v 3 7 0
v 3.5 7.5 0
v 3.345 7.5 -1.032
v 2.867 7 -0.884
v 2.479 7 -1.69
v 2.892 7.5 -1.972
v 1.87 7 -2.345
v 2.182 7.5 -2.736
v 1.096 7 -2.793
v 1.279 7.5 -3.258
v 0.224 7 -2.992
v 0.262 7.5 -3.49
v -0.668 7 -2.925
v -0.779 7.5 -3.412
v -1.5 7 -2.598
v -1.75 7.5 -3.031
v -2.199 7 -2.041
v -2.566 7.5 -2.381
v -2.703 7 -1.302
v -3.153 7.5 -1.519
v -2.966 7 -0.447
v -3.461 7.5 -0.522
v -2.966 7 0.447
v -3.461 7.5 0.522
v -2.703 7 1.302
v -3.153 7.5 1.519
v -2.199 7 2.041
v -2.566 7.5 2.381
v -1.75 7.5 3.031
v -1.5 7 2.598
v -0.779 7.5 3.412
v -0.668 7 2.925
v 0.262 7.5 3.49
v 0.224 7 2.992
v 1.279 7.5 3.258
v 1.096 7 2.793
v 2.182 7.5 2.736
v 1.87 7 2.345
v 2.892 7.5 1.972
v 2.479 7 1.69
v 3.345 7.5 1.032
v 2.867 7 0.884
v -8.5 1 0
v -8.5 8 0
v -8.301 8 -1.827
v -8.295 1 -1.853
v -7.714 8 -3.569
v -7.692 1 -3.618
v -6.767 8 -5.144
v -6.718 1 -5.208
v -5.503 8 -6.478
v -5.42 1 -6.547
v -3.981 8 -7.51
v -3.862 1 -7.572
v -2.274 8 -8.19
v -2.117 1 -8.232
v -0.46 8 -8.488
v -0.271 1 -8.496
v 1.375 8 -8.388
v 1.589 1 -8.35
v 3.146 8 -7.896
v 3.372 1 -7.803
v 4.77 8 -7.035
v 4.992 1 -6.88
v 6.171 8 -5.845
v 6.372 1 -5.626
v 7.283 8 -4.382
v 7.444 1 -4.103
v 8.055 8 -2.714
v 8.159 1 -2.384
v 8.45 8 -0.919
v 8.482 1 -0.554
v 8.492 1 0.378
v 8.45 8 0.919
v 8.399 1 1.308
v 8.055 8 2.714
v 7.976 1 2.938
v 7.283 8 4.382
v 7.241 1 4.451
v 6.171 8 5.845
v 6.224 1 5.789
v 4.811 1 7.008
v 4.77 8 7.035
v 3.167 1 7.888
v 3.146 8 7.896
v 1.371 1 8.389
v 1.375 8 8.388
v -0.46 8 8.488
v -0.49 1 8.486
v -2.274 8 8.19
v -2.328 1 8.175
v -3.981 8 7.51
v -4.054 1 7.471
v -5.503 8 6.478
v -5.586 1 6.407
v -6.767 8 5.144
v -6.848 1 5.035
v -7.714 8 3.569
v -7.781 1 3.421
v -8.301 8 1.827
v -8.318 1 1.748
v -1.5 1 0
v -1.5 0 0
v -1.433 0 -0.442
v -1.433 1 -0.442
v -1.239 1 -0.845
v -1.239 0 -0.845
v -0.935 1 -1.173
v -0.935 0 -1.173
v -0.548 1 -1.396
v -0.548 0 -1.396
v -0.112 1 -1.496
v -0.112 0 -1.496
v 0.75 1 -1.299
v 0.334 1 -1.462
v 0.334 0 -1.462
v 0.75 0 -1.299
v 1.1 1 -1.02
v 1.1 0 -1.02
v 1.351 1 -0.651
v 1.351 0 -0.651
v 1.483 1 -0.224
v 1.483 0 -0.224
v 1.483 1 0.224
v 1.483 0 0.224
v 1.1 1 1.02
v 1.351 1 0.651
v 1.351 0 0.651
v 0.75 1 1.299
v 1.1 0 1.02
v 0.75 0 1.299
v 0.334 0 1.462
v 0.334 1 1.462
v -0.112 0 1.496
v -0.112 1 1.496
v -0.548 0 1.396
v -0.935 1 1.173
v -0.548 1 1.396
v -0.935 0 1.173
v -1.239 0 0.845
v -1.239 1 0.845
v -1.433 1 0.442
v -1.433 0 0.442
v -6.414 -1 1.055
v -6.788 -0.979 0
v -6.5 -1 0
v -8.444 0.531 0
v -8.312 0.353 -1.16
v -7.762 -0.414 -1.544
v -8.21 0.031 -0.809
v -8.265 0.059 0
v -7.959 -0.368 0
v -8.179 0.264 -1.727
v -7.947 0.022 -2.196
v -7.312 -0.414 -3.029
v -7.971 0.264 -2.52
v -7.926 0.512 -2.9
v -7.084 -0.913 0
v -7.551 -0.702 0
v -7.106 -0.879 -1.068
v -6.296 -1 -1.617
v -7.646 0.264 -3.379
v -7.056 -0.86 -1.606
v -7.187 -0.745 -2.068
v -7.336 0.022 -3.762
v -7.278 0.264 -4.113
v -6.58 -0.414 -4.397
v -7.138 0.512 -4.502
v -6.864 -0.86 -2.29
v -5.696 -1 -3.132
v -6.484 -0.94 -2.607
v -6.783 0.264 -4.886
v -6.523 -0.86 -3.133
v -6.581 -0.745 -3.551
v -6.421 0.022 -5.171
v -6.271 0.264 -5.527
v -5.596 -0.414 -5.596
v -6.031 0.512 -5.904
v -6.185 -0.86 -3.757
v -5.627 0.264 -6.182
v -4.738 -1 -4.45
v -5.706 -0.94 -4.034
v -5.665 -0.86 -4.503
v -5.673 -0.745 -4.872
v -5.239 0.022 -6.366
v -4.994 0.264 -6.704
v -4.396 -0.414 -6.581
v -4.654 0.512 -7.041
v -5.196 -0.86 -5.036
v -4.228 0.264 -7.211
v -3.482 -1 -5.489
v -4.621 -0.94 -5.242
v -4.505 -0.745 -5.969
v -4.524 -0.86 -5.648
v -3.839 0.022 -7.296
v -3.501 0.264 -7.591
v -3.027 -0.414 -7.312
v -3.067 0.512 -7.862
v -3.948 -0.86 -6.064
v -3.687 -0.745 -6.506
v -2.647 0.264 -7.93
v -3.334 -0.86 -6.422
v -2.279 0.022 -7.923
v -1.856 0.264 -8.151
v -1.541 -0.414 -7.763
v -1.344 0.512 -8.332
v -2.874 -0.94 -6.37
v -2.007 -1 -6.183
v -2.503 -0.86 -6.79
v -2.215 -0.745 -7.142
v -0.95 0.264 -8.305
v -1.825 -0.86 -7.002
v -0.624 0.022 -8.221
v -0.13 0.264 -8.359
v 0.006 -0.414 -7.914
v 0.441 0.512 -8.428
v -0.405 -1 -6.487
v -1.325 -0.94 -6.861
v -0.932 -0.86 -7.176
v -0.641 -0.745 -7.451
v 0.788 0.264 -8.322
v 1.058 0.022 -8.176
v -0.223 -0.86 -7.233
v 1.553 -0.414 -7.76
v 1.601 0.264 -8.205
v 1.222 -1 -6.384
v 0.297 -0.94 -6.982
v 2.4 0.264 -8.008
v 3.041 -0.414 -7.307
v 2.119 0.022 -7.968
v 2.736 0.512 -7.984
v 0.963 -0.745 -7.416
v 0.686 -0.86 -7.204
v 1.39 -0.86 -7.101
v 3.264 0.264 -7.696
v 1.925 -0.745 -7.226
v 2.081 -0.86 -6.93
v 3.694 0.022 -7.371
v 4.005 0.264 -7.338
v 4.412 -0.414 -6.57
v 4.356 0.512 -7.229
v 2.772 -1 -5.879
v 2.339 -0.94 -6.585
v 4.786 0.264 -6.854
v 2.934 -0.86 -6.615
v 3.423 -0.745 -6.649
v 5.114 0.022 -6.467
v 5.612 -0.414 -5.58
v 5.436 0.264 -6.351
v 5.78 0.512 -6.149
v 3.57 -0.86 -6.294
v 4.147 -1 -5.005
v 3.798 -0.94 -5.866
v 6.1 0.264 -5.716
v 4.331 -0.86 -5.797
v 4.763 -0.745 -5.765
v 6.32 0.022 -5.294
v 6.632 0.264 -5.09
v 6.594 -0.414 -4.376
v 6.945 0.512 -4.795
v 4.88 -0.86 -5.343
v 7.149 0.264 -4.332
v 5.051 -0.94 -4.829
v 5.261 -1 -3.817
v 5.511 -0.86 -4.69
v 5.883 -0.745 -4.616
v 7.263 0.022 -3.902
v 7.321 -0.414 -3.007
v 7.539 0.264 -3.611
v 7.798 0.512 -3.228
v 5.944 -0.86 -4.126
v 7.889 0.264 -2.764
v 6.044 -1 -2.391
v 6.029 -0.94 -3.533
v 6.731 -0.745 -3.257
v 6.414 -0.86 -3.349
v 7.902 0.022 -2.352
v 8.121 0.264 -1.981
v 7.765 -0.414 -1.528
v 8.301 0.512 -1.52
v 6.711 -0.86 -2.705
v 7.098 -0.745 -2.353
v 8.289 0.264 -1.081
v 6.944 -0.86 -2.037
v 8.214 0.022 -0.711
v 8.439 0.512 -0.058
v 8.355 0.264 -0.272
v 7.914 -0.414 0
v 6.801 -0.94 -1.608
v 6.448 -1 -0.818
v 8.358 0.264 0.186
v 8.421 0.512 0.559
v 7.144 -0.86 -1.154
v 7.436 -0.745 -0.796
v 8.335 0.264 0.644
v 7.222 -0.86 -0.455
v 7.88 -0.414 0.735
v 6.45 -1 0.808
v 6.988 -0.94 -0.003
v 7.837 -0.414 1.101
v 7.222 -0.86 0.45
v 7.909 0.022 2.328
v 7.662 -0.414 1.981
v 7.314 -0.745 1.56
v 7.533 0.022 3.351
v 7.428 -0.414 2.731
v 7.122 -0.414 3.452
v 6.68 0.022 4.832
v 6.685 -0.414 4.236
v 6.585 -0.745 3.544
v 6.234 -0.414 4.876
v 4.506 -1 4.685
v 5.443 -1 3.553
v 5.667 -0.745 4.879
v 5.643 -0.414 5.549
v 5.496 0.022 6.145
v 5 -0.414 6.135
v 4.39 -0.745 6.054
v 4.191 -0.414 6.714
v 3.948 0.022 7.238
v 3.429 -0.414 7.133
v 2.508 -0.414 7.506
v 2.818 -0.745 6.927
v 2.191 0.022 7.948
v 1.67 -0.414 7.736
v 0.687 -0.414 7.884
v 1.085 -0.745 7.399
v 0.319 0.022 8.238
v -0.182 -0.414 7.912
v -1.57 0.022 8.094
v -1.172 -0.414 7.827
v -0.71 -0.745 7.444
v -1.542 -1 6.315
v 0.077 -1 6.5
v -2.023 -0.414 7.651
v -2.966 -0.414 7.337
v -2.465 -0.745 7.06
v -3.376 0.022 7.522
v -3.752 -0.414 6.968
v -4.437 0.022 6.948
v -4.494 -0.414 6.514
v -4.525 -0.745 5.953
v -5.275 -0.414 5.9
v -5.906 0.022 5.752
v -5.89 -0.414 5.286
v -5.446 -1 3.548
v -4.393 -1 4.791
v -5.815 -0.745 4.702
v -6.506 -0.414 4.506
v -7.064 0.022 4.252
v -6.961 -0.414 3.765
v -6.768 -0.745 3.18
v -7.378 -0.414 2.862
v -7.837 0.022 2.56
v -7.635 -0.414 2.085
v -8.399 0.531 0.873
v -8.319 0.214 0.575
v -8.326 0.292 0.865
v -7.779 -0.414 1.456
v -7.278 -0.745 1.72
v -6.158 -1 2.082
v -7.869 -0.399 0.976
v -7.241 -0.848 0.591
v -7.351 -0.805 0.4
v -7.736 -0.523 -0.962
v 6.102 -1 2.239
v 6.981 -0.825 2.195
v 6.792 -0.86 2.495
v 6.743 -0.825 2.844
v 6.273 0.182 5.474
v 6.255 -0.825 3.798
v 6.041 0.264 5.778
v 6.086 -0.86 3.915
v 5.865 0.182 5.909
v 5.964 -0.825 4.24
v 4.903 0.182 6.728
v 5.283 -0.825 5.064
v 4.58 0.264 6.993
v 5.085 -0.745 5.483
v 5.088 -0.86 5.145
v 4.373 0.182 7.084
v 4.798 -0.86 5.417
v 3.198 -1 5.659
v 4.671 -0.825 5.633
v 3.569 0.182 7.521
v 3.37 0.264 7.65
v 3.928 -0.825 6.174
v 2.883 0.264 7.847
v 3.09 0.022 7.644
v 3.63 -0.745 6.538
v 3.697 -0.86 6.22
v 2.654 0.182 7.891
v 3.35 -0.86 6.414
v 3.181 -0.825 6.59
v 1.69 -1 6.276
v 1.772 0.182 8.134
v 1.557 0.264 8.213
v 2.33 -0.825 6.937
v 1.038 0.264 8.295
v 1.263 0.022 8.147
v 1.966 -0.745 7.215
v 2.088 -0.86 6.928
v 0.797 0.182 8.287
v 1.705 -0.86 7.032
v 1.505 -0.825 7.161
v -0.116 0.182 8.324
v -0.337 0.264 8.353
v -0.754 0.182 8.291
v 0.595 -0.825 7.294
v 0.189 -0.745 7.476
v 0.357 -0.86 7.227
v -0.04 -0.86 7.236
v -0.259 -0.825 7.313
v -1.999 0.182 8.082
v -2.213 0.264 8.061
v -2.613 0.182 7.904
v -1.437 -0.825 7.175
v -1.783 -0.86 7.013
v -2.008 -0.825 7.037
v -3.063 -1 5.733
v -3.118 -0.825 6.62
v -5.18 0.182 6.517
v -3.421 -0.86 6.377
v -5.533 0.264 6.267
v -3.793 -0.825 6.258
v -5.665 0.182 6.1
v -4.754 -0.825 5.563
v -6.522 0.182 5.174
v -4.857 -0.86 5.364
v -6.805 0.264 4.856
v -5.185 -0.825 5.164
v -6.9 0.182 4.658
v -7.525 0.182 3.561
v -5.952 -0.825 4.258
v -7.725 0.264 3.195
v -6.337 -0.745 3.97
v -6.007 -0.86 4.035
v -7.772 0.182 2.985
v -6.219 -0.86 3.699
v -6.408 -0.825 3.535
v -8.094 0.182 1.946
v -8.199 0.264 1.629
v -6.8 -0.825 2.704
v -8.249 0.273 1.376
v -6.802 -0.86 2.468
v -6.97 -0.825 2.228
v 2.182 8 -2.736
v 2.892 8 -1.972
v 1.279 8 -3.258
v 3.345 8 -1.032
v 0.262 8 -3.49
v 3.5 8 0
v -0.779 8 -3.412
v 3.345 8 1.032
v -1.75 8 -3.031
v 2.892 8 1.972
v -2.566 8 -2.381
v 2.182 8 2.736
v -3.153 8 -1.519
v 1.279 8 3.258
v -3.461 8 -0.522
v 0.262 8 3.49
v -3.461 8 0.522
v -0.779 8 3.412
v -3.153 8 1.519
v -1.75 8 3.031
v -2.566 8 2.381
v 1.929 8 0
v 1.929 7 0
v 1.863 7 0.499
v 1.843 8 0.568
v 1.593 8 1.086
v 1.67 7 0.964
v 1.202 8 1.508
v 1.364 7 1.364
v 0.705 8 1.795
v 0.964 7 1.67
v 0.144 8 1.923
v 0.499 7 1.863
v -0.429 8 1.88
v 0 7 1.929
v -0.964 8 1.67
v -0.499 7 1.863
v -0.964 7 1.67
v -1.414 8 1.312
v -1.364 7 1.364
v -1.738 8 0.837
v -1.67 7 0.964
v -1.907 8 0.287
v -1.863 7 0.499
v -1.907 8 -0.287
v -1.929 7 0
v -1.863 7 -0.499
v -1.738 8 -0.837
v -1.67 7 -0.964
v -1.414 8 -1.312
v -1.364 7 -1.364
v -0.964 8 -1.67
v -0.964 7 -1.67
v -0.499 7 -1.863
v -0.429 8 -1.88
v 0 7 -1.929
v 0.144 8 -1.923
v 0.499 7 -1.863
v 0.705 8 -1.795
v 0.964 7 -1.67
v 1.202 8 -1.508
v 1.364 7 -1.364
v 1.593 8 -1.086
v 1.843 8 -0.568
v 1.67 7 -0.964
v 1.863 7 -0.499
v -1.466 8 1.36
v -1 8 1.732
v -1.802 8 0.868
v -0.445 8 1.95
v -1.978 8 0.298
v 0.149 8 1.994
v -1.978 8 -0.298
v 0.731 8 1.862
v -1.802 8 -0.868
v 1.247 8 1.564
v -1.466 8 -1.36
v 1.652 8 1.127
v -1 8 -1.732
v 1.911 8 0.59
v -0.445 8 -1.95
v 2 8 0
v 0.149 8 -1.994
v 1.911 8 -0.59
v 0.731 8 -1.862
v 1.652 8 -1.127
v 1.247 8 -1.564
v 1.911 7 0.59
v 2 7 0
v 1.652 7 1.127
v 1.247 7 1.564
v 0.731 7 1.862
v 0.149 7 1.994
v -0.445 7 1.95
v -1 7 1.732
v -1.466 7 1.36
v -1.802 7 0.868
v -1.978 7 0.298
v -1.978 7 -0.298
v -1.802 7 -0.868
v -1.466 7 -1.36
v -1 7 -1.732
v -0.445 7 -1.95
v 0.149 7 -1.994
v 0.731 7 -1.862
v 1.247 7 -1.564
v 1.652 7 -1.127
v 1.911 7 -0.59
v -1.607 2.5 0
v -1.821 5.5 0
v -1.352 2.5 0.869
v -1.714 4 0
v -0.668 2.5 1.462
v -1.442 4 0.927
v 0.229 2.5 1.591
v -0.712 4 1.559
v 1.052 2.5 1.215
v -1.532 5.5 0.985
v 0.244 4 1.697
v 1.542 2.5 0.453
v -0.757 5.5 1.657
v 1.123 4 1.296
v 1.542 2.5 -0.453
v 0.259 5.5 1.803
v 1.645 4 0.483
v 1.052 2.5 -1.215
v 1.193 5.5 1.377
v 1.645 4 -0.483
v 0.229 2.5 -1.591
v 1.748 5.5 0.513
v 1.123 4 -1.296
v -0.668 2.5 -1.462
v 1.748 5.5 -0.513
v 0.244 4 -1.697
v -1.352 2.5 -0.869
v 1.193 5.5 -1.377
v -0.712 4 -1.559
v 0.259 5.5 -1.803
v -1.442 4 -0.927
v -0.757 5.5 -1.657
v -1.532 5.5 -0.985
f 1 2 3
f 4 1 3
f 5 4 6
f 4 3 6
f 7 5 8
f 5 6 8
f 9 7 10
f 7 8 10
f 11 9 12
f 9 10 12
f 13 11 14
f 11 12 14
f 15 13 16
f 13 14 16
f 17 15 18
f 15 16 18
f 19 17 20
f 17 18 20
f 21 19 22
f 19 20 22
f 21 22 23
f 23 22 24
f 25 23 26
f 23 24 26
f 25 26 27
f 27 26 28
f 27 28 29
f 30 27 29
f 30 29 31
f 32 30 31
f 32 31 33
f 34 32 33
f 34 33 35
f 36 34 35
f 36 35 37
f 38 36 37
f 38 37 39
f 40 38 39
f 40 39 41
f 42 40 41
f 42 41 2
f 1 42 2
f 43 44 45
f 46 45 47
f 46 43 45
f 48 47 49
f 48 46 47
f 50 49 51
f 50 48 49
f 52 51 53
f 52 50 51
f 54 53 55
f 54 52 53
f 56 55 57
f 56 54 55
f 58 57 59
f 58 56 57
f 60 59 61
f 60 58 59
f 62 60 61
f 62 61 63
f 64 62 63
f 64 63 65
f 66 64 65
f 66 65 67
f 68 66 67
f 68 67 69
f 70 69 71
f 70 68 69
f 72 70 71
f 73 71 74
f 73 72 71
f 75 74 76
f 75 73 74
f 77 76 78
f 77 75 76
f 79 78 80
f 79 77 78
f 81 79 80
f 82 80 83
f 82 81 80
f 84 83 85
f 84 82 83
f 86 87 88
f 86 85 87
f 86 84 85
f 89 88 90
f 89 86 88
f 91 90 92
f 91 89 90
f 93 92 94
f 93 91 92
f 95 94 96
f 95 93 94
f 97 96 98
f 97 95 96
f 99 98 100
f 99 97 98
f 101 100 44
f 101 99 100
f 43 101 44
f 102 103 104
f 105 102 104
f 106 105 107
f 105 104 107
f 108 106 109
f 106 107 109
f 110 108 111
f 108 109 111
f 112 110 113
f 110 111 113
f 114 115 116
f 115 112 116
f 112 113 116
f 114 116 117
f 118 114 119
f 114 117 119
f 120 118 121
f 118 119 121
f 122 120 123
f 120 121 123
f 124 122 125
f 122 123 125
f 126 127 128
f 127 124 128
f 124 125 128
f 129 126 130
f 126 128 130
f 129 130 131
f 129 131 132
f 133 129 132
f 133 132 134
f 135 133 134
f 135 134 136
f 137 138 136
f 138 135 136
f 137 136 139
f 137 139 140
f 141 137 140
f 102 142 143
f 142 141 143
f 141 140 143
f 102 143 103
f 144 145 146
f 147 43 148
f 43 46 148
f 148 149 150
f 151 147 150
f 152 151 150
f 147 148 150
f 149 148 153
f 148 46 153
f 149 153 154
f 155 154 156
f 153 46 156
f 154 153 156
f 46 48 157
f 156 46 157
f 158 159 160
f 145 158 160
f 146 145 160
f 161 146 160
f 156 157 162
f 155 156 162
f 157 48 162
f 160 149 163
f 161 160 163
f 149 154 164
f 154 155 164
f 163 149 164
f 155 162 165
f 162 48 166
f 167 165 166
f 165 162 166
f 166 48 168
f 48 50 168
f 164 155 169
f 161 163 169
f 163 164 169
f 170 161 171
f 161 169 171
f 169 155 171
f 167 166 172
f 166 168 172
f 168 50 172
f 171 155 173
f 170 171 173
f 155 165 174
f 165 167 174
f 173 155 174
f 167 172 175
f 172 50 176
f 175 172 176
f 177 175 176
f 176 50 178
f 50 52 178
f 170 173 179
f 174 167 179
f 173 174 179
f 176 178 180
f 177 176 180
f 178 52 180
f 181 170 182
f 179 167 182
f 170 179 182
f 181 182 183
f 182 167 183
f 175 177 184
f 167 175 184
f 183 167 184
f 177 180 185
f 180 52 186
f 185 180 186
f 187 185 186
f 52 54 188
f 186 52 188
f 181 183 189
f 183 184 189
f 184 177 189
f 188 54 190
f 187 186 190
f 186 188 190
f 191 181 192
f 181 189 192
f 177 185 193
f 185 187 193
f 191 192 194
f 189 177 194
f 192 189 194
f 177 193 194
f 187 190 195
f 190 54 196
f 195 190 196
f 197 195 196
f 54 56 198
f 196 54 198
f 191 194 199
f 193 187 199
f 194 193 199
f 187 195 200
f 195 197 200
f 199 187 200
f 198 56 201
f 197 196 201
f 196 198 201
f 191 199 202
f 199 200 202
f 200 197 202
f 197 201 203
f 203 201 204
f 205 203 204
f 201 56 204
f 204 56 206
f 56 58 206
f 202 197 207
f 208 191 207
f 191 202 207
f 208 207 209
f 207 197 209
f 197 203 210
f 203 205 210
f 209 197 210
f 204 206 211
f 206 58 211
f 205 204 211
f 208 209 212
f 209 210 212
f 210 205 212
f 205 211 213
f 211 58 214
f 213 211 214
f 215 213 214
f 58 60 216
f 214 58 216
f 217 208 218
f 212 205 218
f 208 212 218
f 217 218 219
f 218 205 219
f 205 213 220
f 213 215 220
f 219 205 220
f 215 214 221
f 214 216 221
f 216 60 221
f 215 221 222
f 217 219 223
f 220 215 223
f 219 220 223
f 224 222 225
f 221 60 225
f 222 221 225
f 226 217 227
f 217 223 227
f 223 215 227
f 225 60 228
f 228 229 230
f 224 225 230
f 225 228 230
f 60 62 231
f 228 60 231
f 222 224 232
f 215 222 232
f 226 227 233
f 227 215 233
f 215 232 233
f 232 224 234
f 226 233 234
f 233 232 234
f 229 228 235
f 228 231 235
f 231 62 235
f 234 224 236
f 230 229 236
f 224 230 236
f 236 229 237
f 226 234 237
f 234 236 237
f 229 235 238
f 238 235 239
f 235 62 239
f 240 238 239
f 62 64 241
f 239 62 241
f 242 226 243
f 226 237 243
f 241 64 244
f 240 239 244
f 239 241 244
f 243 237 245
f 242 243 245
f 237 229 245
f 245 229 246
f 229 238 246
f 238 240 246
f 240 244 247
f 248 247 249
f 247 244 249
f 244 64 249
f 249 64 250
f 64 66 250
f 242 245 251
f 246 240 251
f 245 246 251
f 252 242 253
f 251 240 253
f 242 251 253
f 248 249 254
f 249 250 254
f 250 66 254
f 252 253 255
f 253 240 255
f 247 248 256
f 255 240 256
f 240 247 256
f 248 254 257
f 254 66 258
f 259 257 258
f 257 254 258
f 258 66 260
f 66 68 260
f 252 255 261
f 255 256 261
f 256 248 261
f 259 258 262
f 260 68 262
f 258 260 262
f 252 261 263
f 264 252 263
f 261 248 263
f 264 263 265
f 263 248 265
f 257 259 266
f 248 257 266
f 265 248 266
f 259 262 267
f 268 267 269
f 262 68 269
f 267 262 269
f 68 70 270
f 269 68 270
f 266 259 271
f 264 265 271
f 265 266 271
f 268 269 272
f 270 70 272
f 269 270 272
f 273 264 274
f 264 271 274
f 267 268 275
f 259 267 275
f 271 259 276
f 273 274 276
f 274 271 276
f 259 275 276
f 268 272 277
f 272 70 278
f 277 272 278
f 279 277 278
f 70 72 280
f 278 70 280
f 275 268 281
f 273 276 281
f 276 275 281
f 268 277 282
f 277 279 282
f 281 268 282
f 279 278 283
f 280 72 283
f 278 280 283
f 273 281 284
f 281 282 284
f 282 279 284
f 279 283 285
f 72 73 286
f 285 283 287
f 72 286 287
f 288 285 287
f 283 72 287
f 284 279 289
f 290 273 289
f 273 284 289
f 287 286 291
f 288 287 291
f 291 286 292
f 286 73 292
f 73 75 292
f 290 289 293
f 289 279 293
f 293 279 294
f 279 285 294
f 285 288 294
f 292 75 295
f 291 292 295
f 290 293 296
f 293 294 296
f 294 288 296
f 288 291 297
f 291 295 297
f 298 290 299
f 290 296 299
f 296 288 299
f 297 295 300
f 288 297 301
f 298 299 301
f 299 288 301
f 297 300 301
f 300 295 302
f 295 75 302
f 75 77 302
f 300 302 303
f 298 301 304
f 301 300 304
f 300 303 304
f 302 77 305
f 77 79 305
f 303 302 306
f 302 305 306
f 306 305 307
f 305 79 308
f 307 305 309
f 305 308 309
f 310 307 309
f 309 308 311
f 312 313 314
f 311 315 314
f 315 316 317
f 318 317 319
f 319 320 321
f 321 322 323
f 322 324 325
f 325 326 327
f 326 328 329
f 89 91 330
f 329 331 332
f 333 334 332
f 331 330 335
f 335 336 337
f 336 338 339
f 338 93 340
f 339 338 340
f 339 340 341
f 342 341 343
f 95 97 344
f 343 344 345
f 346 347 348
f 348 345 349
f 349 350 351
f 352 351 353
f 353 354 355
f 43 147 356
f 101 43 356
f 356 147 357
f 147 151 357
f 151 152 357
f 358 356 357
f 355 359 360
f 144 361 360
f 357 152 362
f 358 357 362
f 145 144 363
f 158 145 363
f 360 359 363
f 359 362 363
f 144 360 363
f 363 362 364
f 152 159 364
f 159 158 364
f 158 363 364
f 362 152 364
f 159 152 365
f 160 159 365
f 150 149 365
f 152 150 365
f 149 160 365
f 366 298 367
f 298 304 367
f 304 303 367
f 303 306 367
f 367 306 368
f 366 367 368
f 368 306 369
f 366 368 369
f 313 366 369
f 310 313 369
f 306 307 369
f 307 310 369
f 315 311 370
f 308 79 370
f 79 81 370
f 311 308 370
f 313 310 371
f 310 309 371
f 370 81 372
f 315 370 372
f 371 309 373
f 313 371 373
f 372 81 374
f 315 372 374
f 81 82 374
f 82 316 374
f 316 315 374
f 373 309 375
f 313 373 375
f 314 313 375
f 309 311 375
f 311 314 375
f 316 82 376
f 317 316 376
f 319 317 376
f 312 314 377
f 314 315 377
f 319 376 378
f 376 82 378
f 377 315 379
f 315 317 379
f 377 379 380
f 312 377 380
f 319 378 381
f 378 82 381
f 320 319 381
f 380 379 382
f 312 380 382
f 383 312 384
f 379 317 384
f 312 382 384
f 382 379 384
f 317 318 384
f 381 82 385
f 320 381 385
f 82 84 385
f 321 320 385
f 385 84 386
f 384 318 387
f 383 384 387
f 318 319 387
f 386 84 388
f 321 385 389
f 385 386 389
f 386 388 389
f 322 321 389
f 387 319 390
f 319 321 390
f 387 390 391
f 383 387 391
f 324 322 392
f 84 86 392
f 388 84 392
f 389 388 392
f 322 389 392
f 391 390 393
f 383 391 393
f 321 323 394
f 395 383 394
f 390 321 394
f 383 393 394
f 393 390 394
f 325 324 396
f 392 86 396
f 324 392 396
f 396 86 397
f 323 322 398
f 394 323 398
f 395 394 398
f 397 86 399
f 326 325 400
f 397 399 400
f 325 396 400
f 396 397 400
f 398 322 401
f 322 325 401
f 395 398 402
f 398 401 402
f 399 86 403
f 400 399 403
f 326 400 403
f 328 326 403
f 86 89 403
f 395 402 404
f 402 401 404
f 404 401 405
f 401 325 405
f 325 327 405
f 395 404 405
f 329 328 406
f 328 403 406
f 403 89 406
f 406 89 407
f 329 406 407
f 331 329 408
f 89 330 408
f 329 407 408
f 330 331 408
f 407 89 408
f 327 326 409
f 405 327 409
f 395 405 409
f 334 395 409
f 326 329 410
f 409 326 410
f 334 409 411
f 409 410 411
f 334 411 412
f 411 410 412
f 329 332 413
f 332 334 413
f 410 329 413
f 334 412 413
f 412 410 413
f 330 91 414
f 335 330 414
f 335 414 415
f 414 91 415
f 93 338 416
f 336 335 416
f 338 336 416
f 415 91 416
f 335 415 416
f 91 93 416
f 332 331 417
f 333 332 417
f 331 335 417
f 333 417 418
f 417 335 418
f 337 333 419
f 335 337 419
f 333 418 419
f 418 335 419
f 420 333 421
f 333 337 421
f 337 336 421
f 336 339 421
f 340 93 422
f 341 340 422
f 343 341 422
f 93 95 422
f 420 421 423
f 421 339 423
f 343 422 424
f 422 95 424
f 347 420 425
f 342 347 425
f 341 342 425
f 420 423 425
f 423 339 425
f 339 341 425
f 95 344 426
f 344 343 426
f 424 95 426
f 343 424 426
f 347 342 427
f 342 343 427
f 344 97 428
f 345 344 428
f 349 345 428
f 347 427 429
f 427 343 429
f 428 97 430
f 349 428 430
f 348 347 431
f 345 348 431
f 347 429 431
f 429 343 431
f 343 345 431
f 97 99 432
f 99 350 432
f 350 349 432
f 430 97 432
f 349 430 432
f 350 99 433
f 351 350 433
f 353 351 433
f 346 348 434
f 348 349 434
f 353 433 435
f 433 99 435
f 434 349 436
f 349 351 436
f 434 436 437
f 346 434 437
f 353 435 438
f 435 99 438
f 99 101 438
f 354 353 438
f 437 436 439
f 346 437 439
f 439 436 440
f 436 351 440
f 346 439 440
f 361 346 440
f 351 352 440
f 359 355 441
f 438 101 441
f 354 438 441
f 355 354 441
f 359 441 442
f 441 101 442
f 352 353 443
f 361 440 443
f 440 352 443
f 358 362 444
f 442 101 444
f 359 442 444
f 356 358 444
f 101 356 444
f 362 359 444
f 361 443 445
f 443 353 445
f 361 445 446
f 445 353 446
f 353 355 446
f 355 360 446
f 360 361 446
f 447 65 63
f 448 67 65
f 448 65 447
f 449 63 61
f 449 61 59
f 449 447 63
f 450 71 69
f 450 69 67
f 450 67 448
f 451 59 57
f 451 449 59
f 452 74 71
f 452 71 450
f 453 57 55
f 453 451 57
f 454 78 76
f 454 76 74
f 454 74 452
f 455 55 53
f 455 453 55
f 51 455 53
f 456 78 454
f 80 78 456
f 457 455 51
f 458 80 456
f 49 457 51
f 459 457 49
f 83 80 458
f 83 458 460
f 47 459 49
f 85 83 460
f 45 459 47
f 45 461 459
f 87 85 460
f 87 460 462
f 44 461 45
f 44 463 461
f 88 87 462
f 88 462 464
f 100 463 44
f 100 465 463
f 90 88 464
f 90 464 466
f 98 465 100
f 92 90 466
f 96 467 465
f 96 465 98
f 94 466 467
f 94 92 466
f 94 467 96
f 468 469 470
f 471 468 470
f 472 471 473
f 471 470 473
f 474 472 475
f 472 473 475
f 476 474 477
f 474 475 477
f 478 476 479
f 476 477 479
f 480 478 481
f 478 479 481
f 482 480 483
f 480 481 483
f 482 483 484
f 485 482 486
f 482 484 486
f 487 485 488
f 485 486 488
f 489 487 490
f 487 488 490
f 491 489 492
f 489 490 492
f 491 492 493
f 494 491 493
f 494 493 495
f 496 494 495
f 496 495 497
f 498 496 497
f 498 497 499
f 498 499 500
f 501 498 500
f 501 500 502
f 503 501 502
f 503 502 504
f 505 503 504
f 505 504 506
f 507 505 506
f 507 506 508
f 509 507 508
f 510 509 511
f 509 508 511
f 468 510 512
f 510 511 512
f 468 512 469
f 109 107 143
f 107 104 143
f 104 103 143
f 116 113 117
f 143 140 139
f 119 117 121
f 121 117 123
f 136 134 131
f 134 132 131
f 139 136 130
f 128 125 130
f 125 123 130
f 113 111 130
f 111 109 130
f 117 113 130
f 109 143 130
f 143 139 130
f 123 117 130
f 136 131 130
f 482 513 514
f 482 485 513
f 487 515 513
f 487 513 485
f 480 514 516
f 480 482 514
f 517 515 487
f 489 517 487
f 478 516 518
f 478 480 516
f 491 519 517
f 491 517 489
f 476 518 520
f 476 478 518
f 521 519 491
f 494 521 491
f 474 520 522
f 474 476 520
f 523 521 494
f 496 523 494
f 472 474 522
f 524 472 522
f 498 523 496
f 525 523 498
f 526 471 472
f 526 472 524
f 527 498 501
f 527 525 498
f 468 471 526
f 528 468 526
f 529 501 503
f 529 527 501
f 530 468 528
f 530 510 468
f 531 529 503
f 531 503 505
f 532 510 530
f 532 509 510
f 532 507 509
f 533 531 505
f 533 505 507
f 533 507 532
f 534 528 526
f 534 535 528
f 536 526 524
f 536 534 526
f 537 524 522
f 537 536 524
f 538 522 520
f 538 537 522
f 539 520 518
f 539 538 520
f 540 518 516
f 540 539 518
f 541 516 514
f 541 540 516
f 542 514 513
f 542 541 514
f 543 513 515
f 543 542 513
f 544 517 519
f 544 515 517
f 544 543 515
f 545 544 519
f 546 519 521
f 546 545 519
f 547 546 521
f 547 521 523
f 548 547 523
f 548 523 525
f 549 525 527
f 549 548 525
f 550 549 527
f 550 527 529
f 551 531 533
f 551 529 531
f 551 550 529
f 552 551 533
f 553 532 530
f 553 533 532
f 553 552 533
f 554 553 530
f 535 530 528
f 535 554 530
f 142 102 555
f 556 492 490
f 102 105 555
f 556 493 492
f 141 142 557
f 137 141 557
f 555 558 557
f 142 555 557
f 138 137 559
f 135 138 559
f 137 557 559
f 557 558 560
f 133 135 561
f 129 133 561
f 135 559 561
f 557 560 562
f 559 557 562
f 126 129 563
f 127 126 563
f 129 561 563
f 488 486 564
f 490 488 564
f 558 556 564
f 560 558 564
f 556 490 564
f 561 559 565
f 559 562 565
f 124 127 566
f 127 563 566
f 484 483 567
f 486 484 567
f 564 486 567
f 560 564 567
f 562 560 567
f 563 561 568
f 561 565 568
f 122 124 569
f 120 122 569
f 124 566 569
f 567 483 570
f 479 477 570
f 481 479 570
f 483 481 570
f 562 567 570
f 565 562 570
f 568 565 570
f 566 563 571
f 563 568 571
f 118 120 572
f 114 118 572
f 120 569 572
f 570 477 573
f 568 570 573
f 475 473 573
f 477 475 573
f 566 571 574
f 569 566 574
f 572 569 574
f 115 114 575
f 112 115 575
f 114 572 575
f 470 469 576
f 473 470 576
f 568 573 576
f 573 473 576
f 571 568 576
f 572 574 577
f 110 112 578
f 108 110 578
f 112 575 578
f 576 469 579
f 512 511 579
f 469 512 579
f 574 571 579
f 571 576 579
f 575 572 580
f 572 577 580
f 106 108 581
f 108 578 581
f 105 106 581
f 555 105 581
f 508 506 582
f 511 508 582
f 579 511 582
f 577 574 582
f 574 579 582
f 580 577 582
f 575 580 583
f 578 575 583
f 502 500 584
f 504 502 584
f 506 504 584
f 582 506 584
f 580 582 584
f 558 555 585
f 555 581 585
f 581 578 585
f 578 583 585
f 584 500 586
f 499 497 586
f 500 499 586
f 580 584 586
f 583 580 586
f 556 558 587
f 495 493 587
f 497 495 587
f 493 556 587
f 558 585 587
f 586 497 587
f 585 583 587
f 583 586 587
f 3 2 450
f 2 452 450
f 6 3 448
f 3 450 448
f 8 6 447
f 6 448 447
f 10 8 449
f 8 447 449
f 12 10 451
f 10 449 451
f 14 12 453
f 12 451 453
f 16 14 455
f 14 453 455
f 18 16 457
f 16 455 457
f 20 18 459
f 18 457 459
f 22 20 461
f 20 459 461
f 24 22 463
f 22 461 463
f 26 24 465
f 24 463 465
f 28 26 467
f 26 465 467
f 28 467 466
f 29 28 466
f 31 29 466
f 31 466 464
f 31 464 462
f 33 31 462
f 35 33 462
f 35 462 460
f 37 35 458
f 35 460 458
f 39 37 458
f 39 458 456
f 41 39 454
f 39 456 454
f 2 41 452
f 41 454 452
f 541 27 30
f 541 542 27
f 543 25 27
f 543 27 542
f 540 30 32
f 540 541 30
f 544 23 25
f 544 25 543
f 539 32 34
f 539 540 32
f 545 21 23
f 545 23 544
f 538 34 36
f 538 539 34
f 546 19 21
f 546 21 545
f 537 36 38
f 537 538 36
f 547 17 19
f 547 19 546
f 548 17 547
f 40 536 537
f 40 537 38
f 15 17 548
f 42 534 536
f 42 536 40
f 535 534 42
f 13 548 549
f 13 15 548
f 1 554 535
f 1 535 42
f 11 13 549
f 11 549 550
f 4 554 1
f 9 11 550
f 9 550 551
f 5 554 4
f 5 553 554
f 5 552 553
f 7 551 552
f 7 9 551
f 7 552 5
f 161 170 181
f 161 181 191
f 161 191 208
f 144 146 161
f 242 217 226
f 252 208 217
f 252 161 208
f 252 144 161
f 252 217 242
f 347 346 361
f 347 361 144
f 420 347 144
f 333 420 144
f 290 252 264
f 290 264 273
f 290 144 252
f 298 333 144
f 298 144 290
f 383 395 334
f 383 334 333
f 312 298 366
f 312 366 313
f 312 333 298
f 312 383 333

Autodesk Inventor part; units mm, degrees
ref_plane "YZ Plane" through (0, 0, 0) normal (1, 0, 0) x (0, 1, 0)
ref_plane "XZ Plane" through (0, 0, 0) normal (0, 1, 0) x (-1, 0, 0)
ref_plane "XY Plane" through (0, 0, 0) normal (0, 0, 1) x (1, 0, 0)
sketch "Sketch1" plane through (0, 0, 0) normal (0, 1, 0) x (-1, 0, 0)
  circle A0 centre (0, 0) radius 1.5
  circle A1 centre (0, 0) radius 8.5
  dimension "d0" = 3
  dimension "d1" = 17
extrude "Extrusion1" add sketch "Sketch1" along normal blind 8
chamfer "Chamfer1" distance 0.5 distance2 7 1 edges at (1.5, 8, 0) measured on face at (-6.0698, 8, -0.7977)
sketch "Sketch2" plane through (0, 0, 0) normal (0, -1, 0) x (1, 0, 0)
  circle A0 centre (0, 0) radius 8.5 projected
extrude "Extrusion2" add sketch "Sketch2" along normal blind 1
fillet "Fillet1" radius 2 1 edges at (-8.5, -1, 0)
sketch "Sketch3" plane through (0, 8, 0) normal (0, 1, 0) x (1, 0, 0)
  circle A0 centre (0, 0) radius 2 projected
  circle A1 centre (0, 0) radius 3.5
  dimension "d10" = 7
extrude "Extrusion3" cut sketch "Sketch3" against normal blind 1 contours A0 | A1
sketch "Sketch4" plane through (0, 7, 0) normal (0, 1, 0) x (1, 0, 0)
  circle A0 centre (0, 0) radius 1.9286 projected
  circle A1 centre (0, 0) radius 3.5 projected
  circle A2 centre (0, 0) radius 2
  dimension "d13" = 4
extrude "Extrusion4" add sketch "Sketch4" along normal blind 1 contours A2
chamfer "Chamfer2" distance 0.5 angle 45 1 edges at (-3.5, 7, 0)
equation "\"BendRadius\" = Thickness"
equation "\"BendReliefWidth\" = Thickness"
equation "\"BendReliefDepth\" = 0.5 * Thickness"
equation "\"CornerReliefSize\" = 4 * Thickness"
equation "\"MinimumRemnant\" = 2 * Thickness"
equation "\"TransitionRadius\" = BendRadius"
equation "\"JacobiRadiusSize\" = BendRadius"
equation "\"GapSize\" = Thickness"
equation "\"Thickness\" = 0.5"
properties part number "powerButtonPart1"
